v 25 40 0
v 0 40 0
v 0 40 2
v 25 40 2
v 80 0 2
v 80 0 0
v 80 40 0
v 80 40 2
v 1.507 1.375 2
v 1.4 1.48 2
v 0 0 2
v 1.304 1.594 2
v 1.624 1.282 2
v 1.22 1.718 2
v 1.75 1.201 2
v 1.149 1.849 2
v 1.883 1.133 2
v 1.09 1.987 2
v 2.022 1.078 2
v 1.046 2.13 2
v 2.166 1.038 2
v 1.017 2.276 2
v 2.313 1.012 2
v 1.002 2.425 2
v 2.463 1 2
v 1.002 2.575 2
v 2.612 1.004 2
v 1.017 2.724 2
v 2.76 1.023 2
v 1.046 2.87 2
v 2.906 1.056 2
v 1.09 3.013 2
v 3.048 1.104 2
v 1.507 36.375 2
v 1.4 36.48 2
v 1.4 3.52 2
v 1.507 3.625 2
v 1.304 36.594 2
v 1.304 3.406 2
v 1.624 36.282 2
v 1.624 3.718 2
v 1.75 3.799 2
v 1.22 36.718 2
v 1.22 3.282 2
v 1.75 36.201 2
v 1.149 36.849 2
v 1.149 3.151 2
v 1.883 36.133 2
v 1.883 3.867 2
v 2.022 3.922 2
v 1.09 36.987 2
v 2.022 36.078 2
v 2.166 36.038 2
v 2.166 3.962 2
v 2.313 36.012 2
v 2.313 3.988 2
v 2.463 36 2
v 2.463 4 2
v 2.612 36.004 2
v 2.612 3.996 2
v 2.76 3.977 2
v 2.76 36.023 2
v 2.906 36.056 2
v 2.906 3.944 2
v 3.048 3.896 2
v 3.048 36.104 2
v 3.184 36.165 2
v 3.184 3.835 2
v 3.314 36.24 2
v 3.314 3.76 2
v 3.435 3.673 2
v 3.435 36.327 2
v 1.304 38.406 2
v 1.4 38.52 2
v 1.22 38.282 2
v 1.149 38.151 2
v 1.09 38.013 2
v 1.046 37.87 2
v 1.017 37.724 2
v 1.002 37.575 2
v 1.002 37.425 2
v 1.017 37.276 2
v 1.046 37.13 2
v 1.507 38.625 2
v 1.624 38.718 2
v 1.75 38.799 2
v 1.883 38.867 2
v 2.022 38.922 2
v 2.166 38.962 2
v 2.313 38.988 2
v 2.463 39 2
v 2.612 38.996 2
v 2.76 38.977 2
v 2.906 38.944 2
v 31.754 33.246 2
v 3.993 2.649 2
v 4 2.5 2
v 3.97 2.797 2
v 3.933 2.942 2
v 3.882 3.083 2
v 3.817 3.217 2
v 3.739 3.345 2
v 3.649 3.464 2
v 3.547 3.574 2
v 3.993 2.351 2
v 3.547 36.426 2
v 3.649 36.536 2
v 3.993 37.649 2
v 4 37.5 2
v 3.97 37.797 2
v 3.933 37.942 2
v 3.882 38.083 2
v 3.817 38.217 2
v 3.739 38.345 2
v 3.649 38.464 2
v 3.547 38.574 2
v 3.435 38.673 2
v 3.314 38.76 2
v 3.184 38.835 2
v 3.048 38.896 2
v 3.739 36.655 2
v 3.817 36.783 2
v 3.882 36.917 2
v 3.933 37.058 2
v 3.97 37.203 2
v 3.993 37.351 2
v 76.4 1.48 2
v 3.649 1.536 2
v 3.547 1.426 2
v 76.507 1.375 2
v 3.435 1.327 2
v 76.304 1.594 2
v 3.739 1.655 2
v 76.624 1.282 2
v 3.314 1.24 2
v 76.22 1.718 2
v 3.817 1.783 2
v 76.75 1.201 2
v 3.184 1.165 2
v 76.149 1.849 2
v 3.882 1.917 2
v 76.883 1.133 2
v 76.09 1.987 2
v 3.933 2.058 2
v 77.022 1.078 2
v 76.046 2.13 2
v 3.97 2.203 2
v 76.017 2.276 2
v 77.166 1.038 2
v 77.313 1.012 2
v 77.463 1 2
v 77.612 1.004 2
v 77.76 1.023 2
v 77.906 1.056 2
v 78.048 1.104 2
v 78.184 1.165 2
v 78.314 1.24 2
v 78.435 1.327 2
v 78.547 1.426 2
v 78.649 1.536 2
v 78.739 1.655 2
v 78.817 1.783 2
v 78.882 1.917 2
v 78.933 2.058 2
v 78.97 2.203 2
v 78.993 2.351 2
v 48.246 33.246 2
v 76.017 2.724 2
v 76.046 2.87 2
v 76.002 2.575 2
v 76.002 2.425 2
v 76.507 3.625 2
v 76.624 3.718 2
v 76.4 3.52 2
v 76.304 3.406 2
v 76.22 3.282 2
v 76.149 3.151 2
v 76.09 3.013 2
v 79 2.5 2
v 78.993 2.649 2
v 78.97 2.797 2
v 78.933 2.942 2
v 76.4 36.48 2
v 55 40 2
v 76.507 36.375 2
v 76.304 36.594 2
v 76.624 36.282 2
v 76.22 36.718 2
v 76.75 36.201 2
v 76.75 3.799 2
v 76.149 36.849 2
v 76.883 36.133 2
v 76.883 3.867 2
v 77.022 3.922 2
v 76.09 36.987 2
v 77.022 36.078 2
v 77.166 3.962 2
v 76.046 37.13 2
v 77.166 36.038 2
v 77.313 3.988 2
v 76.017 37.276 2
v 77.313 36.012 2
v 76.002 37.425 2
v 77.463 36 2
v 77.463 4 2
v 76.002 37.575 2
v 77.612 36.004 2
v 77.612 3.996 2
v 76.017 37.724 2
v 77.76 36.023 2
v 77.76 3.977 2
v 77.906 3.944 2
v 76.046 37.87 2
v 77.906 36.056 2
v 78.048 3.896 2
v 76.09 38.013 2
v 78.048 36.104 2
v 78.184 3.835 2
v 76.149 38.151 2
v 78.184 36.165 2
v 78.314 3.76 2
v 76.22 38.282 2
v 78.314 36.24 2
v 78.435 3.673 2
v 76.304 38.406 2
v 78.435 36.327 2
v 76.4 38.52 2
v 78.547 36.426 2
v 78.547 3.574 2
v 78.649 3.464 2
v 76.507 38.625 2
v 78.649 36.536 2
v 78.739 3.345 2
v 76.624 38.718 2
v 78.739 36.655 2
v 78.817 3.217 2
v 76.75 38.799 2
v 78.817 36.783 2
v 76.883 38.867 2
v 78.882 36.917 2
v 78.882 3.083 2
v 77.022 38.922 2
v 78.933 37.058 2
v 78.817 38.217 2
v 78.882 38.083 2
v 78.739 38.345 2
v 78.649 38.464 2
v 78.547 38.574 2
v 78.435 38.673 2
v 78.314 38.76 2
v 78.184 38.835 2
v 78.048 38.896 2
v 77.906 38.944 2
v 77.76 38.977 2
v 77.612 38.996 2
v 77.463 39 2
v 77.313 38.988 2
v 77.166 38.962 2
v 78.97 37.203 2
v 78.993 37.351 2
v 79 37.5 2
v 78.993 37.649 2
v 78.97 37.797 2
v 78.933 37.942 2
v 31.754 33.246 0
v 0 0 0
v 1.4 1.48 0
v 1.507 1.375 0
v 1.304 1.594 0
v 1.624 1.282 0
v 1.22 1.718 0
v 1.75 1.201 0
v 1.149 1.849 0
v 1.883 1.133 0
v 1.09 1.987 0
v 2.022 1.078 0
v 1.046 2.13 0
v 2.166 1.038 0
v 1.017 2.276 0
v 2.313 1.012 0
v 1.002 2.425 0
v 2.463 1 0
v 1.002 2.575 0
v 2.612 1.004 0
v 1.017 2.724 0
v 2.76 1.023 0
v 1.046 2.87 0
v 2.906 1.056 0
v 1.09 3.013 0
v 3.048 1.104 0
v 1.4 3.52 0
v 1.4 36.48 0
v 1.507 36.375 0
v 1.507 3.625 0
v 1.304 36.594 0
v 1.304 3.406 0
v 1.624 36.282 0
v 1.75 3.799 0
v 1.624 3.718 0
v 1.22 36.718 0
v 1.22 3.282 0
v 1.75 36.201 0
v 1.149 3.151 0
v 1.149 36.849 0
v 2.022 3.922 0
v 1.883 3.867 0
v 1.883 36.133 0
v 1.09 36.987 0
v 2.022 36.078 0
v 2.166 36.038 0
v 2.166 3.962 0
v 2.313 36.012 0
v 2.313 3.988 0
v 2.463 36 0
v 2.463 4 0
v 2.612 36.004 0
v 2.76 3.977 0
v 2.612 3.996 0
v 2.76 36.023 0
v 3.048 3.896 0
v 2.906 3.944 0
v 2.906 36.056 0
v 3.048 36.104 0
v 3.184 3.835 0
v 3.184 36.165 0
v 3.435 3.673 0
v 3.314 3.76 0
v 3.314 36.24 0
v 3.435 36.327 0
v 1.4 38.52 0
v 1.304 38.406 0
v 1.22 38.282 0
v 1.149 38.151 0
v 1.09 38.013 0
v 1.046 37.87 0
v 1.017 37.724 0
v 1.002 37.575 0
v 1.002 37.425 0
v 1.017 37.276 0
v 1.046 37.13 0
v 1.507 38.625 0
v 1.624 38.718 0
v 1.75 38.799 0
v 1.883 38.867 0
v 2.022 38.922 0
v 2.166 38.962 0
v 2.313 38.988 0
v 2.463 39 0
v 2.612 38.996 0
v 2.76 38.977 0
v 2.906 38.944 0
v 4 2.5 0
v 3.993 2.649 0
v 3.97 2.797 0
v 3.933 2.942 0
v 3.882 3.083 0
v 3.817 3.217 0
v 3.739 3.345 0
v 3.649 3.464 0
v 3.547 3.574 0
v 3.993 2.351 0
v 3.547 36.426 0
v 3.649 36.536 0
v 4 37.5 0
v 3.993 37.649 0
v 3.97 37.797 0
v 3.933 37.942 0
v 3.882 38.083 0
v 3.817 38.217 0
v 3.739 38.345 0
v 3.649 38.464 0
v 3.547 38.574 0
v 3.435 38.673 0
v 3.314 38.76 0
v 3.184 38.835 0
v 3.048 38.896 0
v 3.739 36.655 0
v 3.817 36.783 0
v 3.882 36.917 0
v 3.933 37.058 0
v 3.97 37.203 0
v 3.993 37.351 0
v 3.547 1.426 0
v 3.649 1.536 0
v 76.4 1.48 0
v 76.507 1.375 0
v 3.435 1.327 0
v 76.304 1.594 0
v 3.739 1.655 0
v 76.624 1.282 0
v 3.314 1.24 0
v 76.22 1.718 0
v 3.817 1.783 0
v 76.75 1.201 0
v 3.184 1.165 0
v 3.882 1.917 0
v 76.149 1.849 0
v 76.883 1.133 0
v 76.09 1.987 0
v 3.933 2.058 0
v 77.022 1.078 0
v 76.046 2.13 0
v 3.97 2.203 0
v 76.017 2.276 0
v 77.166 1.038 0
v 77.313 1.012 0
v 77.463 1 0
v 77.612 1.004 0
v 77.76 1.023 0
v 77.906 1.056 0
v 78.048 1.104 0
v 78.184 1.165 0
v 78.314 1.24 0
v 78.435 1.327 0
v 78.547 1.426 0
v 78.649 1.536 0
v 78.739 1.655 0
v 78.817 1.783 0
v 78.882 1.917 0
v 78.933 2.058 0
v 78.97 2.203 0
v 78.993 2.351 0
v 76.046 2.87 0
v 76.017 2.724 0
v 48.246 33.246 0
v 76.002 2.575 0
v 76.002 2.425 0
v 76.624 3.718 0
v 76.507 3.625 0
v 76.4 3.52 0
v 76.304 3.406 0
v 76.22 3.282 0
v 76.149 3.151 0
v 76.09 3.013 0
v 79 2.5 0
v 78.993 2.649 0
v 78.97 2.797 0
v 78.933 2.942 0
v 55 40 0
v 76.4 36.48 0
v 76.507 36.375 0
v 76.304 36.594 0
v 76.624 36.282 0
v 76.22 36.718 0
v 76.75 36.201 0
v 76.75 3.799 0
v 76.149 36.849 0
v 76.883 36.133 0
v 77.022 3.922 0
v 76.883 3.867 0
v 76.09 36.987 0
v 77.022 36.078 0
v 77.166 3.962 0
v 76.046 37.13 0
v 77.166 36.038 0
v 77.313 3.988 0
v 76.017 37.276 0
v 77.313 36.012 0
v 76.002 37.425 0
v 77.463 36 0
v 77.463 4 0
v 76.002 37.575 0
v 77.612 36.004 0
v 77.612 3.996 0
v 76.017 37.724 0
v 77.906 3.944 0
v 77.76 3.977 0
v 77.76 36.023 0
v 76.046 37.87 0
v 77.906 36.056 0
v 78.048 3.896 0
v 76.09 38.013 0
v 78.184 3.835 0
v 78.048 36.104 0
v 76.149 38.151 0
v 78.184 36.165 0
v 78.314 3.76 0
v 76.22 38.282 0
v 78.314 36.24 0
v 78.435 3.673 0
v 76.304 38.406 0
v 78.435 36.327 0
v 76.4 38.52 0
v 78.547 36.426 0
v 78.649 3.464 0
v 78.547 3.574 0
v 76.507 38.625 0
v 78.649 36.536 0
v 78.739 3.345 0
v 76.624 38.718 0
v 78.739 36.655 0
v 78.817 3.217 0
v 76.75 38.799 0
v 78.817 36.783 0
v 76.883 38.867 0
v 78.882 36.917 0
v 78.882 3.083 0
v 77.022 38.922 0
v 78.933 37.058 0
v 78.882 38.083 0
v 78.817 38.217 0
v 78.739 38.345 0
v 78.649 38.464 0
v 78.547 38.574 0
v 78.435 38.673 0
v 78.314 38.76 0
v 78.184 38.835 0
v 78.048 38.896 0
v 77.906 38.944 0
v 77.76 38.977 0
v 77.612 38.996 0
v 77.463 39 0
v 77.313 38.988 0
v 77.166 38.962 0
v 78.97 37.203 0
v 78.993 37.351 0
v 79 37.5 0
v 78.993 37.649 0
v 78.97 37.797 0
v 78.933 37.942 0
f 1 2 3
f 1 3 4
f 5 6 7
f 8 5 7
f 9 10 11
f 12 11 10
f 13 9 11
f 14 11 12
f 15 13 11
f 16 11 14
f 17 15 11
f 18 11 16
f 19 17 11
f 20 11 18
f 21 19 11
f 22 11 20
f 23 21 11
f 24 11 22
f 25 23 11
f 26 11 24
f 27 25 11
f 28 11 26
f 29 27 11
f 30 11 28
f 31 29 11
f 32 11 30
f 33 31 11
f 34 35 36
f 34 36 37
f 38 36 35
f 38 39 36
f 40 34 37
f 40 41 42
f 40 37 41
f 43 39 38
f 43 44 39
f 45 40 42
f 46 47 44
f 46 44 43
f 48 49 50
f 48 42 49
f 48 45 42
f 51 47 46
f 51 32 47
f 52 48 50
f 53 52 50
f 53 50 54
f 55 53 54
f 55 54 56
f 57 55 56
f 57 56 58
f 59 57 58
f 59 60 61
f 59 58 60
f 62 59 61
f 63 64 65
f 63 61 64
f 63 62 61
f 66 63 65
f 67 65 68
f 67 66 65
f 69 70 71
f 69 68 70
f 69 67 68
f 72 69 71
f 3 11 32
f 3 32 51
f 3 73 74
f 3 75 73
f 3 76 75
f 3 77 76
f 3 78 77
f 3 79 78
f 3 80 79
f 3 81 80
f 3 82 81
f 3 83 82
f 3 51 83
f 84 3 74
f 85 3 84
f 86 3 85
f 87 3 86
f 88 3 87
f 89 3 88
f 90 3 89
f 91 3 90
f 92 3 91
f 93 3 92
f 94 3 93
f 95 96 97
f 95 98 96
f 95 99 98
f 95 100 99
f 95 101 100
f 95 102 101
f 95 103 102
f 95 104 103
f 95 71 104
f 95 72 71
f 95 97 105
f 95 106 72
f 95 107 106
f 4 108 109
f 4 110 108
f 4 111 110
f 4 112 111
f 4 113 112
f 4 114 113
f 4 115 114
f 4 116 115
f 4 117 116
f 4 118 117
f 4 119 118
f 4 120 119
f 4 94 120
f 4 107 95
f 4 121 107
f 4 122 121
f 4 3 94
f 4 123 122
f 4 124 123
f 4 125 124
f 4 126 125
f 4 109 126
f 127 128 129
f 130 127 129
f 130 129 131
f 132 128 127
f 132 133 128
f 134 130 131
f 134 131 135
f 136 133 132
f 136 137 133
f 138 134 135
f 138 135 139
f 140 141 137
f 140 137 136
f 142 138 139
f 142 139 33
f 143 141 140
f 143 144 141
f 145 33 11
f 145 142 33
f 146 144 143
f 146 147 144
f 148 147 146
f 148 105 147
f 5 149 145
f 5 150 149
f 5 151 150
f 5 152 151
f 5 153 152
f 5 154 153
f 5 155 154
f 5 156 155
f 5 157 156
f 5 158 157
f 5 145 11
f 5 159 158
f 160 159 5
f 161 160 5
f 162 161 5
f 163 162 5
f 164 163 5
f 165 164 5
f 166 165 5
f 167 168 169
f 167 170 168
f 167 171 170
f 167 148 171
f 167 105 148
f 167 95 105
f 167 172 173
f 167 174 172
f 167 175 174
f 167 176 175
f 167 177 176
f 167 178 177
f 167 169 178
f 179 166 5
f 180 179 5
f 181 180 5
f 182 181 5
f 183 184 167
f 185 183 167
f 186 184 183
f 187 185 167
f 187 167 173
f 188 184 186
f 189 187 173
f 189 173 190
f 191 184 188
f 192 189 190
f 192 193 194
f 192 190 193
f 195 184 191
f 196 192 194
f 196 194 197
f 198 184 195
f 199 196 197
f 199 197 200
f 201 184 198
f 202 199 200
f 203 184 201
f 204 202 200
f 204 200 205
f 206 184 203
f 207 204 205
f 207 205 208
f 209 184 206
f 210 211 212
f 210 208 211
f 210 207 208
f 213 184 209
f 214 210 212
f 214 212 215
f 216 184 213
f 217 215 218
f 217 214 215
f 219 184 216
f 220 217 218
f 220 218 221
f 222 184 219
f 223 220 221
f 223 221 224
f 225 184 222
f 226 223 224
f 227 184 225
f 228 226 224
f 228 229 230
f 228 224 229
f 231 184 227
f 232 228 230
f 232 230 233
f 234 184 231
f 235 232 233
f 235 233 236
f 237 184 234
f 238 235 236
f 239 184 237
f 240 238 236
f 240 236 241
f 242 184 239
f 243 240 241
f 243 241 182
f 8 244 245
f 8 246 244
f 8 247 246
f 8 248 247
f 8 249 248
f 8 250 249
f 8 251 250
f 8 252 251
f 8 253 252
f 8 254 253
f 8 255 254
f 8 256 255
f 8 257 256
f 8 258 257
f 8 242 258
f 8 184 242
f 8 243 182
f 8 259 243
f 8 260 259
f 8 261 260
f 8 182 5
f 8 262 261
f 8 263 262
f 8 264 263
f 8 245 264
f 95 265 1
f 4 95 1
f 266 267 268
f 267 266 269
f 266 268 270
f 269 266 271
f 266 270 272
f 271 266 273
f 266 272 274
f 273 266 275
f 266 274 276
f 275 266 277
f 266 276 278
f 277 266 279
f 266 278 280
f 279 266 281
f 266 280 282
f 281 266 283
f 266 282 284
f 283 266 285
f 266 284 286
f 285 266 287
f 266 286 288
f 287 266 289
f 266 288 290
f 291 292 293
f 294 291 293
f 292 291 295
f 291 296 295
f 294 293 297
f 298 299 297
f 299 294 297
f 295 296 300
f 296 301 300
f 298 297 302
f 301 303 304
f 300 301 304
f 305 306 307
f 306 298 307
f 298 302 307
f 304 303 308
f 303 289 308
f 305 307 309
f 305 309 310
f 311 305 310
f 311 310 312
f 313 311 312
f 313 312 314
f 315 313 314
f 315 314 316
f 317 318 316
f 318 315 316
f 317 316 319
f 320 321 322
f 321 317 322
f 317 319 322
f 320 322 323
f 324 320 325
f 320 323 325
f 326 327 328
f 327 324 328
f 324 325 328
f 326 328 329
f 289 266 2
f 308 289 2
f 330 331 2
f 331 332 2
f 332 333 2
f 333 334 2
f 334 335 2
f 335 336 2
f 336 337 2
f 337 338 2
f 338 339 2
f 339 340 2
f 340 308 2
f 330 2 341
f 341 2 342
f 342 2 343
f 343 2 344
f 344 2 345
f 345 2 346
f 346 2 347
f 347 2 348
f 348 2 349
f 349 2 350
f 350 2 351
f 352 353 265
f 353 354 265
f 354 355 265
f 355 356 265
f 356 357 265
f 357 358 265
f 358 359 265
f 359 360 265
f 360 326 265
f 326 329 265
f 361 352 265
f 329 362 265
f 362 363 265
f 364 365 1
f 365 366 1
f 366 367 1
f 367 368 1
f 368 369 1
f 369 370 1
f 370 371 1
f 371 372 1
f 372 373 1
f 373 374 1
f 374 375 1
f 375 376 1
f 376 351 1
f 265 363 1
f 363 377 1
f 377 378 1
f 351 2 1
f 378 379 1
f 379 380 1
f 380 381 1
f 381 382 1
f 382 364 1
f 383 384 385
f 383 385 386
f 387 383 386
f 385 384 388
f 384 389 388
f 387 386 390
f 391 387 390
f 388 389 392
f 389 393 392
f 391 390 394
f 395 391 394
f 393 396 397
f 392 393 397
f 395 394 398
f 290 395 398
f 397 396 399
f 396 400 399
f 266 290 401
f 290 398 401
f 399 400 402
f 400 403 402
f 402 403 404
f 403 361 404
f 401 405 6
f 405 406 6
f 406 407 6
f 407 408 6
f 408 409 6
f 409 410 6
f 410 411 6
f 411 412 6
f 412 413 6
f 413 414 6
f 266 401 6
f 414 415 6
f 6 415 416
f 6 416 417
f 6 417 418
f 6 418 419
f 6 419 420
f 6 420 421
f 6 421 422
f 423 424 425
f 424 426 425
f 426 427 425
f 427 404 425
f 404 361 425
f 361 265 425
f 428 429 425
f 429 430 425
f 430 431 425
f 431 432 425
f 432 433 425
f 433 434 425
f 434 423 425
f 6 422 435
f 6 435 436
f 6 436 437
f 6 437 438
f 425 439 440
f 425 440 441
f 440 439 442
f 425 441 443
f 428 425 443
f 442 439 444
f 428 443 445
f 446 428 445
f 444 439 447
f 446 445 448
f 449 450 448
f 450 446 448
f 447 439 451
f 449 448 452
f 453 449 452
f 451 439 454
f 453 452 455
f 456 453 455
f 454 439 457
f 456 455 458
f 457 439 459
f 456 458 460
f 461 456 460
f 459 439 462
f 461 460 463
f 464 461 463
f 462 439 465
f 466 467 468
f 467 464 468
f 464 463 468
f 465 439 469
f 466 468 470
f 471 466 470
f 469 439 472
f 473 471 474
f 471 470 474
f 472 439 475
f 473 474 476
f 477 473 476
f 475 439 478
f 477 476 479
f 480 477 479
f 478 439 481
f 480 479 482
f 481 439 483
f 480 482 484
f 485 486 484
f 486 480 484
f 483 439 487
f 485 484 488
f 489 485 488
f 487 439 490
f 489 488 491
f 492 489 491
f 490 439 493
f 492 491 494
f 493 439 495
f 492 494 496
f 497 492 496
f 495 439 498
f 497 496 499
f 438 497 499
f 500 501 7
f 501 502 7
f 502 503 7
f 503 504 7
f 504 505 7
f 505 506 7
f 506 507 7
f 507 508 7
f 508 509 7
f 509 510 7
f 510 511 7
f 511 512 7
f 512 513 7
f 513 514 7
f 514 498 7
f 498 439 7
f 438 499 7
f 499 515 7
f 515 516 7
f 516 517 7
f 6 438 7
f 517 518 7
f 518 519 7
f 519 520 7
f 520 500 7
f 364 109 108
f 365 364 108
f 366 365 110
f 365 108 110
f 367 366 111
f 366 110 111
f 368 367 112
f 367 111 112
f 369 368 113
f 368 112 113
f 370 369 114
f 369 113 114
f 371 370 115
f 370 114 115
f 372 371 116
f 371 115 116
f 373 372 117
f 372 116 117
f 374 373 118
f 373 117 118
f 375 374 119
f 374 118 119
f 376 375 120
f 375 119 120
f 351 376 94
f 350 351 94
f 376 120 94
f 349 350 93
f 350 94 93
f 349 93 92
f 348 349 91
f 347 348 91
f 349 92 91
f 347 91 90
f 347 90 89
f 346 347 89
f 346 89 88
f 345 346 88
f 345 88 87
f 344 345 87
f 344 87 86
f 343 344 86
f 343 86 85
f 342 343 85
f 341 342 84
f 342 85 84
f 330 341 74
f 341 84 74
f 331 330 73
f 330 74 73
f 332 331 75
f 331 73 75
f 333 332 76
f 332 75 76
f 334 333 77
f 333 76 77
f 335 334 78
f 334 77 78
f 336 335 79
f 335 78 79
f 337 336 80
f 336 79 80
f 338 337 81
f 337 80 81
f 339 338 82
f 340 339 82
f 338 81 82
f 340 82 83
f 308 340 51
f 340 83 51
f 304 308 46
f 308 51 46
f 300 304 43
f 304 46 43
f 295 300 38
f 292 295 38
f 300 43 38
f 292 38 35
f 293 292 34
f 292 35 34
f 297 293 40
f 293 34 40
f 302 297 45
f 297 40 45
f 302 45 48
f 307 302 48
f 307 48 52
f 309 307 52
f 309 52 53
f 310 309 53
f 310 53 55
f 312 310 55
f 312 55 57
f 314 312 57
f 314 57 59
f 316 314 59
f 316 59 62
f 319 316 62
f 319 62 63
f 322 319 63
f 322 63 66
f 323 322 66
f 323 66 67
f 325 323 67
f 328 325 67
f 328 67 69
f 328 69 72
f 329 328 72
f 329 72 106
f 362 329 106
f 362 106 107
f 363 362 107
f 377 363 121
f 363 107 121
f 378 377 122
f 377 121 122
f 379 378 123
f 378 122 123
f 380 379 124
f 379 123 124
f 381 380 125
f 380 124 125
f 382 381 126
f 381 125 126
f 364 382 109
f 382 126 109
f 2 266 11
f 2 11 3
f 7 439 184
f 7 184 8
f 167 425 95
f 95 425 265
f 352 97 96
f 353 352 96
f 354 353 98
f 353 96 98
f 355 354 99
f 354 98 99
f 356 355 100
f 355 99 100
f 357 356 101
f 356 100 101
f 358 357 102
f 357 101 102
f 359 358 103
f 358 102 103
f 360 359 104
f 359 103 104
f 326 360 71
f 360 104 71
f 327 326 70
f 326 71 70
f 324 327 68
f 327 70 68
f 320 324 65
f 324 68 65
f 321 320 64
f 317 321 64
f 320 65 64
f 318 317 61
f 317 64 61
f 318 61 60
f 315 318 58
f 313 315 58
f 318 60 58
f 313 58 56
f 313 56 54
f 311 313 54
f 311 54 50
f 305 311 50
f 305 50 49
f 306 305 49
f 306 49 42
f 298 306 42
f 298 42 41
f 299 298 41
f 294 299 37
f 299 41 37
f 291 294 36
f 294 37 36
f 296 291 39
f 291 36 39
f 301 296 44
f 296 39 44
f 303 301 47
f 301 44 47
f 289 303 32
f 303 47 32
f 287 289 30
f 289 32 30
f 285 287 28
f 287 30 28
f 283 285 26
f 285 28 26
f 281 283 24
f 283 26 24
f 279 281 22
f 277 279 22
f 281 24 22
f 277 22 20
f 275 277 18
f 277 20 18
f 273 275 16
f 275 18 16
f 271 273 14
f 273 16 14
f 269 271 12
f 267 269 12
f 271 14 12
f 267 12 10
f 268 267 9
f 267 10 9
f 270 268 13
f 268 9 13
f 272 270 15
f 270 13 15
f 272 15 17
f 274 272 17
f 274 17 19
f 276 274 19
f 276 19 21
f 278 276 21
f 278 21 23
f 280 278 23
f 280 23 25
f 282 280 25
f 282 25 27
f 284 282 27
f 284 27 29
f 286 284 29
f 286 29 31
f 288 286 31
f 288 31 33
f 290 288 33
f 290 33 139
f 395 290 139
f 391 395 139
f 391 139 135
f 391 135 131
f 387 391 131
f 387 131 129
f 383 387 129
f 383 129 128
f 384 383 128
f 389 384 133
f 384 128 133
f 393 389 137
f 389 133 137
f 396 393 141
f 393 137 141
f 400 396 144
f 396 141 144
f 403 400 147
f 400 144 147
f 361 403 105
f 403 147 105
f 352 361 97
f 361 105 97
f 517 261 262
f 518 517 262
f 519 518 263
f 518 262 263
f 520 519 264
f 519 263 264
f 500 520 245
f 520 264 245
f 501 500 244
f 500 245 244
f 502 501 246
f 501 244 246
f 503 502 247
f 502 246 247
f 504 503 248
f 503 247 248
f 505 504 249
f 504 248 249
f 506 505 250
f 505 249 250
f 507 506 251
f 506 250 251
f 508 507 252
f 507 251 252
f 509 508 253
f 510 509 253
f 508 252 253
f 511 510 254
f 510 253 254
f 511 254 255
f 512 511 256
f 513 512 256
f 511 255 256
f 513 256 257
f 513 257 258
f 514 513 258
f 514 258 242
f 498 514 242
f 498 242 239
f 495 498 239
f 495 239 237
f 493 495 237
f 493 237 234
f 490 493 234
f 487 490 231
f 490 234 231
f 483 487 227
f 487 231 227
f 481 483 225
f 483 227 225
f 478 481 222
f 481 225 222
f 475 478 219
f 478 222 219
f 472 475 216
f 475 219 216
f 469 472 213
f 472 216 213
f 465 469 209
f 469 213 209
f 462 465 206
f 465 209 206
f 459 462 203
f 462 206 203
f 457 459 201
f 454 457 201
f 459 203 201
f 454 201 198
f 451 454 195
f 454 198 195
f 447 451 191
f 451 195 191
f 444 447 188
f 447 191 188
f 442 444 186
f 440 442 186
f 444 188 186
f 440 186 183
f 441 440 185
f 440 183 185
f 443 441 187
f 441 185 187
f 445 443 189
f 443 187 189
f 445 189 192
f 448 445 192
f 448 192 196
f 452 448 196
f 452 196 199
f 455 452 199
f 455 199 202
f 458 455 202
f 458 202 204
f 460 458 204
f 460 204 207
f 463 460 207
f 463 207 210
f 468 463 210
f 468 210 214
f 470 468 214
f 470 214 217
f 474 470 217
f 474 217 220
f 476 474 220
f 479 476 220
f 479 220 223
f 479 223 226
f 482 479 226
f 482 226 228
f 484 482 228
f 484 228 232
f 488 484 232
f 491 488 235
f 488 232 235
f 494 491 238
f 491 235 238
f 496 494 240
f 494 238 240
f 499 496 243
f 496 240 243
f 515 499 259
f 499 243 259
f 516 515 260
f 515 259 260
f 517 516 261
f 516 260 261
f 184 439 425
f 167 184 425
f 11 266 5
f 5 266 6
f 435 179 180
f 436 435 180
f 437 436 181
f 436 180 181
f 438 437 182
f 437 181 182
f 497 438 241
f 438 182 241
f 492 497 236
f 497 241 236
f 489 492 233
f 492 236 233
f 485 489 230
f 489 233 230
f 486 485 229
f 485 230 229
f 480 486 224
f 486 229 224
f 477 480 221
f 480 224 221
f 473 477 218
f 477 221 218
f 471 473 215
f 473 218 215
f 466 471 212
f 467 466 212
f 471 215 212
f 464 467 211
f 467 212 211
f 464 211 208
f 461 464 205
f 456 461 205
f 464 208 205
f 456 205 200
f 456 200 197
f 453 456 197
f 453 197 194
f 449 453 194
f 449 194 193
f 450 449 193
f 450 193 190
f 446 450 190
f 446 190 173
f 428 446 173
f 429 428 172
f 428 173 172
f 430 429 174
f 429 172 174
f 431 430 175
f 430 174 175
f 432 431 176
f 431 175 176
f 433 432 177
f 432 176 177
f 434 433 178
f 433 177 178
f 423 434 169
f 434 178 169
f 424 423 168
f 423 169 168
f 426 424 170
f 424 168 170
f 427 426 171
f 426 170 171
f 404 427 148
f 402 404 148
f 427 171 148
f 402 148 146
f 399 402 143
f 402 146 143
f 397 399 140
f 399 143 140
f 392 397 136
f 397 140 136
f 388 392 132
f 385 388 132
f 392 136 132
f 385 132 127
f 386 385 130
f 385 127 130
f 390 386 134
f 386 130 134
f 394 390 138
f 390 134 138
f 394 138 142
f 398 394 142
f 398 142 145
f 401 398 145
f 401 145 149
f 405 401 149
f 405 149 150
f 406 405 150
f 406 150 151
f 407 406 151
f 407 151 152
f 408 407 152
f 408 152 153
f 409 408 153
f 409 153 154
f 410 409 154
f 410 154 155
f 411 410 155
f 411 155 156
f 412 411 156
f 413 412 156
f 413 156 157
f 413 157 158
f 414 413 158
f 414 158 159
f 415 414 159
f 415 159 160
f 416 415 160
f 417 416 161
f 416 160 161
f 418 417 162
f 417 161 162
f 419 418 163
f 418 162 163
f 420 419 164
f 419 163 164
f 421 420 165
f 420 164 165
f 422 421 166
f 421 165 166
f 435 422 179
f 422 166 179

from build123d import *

# Parameters (mm, degrees)
ESQUISSE1_W             = 80
ESQUISSE1_H             = 40
BOSS_EXTRU_1_DEPTH      = 2
ESQUISSE2_R             = 1.5
ENL_V_MAT_EXTRU_1_DEPTH = 2
ENL_V_MAT_EXTRU_2_DEPTH = 10


with BuildPart() as part:
    # Esquisse1 → Boss.-Extru.1 (new body)
    with BuildSketch(Plane.XY):
        with Locations((40, 20)):
            Rectangle(ESQUISSE1_W, ESQUISSE1_H)
    extrude(amount=BOSS_EXTRU_1_DEPTH)

    # Esquisse2 → Enlèv. mat.-Extru.1 (cut)
    with BuildSketch(Plane.XY.offset(2)):
        with Locations((2.5, 37.5)):
            Circle(ESQUISSE2_R)
        with Locations((77.5, 37.5)):
            Circle(ESQUISSE2_R)
        with Locations((2.5, 2.5)):
            Circle(ESQUISSE2_R)
        with Locations((77.5, 2.5)):
            Circle(ESQUISSE2_R)
    extrude(amount=-ENL_V_MAT_EXTRU_1_DEPTH, mode=Mode.SUBTRACT)

    # Esquisse3 → Enlèv. mat.-Extru.2 (cut)
    with BuildSketch(Plane(origin=(0, 0, 0), x_dir=(-1, 0, 0), z_dir=(0, 0, -1))):
        Polygon((-25, 40), (-55, 40), (-48.246308582, 33.246308582), (-31.753691418, 33.246308582), align=None)
    extrude(amount=-ENL_V_MAT_EXTRU_2_DEPTH, mode=Mode.SUBTRACT)


solid = part.part
